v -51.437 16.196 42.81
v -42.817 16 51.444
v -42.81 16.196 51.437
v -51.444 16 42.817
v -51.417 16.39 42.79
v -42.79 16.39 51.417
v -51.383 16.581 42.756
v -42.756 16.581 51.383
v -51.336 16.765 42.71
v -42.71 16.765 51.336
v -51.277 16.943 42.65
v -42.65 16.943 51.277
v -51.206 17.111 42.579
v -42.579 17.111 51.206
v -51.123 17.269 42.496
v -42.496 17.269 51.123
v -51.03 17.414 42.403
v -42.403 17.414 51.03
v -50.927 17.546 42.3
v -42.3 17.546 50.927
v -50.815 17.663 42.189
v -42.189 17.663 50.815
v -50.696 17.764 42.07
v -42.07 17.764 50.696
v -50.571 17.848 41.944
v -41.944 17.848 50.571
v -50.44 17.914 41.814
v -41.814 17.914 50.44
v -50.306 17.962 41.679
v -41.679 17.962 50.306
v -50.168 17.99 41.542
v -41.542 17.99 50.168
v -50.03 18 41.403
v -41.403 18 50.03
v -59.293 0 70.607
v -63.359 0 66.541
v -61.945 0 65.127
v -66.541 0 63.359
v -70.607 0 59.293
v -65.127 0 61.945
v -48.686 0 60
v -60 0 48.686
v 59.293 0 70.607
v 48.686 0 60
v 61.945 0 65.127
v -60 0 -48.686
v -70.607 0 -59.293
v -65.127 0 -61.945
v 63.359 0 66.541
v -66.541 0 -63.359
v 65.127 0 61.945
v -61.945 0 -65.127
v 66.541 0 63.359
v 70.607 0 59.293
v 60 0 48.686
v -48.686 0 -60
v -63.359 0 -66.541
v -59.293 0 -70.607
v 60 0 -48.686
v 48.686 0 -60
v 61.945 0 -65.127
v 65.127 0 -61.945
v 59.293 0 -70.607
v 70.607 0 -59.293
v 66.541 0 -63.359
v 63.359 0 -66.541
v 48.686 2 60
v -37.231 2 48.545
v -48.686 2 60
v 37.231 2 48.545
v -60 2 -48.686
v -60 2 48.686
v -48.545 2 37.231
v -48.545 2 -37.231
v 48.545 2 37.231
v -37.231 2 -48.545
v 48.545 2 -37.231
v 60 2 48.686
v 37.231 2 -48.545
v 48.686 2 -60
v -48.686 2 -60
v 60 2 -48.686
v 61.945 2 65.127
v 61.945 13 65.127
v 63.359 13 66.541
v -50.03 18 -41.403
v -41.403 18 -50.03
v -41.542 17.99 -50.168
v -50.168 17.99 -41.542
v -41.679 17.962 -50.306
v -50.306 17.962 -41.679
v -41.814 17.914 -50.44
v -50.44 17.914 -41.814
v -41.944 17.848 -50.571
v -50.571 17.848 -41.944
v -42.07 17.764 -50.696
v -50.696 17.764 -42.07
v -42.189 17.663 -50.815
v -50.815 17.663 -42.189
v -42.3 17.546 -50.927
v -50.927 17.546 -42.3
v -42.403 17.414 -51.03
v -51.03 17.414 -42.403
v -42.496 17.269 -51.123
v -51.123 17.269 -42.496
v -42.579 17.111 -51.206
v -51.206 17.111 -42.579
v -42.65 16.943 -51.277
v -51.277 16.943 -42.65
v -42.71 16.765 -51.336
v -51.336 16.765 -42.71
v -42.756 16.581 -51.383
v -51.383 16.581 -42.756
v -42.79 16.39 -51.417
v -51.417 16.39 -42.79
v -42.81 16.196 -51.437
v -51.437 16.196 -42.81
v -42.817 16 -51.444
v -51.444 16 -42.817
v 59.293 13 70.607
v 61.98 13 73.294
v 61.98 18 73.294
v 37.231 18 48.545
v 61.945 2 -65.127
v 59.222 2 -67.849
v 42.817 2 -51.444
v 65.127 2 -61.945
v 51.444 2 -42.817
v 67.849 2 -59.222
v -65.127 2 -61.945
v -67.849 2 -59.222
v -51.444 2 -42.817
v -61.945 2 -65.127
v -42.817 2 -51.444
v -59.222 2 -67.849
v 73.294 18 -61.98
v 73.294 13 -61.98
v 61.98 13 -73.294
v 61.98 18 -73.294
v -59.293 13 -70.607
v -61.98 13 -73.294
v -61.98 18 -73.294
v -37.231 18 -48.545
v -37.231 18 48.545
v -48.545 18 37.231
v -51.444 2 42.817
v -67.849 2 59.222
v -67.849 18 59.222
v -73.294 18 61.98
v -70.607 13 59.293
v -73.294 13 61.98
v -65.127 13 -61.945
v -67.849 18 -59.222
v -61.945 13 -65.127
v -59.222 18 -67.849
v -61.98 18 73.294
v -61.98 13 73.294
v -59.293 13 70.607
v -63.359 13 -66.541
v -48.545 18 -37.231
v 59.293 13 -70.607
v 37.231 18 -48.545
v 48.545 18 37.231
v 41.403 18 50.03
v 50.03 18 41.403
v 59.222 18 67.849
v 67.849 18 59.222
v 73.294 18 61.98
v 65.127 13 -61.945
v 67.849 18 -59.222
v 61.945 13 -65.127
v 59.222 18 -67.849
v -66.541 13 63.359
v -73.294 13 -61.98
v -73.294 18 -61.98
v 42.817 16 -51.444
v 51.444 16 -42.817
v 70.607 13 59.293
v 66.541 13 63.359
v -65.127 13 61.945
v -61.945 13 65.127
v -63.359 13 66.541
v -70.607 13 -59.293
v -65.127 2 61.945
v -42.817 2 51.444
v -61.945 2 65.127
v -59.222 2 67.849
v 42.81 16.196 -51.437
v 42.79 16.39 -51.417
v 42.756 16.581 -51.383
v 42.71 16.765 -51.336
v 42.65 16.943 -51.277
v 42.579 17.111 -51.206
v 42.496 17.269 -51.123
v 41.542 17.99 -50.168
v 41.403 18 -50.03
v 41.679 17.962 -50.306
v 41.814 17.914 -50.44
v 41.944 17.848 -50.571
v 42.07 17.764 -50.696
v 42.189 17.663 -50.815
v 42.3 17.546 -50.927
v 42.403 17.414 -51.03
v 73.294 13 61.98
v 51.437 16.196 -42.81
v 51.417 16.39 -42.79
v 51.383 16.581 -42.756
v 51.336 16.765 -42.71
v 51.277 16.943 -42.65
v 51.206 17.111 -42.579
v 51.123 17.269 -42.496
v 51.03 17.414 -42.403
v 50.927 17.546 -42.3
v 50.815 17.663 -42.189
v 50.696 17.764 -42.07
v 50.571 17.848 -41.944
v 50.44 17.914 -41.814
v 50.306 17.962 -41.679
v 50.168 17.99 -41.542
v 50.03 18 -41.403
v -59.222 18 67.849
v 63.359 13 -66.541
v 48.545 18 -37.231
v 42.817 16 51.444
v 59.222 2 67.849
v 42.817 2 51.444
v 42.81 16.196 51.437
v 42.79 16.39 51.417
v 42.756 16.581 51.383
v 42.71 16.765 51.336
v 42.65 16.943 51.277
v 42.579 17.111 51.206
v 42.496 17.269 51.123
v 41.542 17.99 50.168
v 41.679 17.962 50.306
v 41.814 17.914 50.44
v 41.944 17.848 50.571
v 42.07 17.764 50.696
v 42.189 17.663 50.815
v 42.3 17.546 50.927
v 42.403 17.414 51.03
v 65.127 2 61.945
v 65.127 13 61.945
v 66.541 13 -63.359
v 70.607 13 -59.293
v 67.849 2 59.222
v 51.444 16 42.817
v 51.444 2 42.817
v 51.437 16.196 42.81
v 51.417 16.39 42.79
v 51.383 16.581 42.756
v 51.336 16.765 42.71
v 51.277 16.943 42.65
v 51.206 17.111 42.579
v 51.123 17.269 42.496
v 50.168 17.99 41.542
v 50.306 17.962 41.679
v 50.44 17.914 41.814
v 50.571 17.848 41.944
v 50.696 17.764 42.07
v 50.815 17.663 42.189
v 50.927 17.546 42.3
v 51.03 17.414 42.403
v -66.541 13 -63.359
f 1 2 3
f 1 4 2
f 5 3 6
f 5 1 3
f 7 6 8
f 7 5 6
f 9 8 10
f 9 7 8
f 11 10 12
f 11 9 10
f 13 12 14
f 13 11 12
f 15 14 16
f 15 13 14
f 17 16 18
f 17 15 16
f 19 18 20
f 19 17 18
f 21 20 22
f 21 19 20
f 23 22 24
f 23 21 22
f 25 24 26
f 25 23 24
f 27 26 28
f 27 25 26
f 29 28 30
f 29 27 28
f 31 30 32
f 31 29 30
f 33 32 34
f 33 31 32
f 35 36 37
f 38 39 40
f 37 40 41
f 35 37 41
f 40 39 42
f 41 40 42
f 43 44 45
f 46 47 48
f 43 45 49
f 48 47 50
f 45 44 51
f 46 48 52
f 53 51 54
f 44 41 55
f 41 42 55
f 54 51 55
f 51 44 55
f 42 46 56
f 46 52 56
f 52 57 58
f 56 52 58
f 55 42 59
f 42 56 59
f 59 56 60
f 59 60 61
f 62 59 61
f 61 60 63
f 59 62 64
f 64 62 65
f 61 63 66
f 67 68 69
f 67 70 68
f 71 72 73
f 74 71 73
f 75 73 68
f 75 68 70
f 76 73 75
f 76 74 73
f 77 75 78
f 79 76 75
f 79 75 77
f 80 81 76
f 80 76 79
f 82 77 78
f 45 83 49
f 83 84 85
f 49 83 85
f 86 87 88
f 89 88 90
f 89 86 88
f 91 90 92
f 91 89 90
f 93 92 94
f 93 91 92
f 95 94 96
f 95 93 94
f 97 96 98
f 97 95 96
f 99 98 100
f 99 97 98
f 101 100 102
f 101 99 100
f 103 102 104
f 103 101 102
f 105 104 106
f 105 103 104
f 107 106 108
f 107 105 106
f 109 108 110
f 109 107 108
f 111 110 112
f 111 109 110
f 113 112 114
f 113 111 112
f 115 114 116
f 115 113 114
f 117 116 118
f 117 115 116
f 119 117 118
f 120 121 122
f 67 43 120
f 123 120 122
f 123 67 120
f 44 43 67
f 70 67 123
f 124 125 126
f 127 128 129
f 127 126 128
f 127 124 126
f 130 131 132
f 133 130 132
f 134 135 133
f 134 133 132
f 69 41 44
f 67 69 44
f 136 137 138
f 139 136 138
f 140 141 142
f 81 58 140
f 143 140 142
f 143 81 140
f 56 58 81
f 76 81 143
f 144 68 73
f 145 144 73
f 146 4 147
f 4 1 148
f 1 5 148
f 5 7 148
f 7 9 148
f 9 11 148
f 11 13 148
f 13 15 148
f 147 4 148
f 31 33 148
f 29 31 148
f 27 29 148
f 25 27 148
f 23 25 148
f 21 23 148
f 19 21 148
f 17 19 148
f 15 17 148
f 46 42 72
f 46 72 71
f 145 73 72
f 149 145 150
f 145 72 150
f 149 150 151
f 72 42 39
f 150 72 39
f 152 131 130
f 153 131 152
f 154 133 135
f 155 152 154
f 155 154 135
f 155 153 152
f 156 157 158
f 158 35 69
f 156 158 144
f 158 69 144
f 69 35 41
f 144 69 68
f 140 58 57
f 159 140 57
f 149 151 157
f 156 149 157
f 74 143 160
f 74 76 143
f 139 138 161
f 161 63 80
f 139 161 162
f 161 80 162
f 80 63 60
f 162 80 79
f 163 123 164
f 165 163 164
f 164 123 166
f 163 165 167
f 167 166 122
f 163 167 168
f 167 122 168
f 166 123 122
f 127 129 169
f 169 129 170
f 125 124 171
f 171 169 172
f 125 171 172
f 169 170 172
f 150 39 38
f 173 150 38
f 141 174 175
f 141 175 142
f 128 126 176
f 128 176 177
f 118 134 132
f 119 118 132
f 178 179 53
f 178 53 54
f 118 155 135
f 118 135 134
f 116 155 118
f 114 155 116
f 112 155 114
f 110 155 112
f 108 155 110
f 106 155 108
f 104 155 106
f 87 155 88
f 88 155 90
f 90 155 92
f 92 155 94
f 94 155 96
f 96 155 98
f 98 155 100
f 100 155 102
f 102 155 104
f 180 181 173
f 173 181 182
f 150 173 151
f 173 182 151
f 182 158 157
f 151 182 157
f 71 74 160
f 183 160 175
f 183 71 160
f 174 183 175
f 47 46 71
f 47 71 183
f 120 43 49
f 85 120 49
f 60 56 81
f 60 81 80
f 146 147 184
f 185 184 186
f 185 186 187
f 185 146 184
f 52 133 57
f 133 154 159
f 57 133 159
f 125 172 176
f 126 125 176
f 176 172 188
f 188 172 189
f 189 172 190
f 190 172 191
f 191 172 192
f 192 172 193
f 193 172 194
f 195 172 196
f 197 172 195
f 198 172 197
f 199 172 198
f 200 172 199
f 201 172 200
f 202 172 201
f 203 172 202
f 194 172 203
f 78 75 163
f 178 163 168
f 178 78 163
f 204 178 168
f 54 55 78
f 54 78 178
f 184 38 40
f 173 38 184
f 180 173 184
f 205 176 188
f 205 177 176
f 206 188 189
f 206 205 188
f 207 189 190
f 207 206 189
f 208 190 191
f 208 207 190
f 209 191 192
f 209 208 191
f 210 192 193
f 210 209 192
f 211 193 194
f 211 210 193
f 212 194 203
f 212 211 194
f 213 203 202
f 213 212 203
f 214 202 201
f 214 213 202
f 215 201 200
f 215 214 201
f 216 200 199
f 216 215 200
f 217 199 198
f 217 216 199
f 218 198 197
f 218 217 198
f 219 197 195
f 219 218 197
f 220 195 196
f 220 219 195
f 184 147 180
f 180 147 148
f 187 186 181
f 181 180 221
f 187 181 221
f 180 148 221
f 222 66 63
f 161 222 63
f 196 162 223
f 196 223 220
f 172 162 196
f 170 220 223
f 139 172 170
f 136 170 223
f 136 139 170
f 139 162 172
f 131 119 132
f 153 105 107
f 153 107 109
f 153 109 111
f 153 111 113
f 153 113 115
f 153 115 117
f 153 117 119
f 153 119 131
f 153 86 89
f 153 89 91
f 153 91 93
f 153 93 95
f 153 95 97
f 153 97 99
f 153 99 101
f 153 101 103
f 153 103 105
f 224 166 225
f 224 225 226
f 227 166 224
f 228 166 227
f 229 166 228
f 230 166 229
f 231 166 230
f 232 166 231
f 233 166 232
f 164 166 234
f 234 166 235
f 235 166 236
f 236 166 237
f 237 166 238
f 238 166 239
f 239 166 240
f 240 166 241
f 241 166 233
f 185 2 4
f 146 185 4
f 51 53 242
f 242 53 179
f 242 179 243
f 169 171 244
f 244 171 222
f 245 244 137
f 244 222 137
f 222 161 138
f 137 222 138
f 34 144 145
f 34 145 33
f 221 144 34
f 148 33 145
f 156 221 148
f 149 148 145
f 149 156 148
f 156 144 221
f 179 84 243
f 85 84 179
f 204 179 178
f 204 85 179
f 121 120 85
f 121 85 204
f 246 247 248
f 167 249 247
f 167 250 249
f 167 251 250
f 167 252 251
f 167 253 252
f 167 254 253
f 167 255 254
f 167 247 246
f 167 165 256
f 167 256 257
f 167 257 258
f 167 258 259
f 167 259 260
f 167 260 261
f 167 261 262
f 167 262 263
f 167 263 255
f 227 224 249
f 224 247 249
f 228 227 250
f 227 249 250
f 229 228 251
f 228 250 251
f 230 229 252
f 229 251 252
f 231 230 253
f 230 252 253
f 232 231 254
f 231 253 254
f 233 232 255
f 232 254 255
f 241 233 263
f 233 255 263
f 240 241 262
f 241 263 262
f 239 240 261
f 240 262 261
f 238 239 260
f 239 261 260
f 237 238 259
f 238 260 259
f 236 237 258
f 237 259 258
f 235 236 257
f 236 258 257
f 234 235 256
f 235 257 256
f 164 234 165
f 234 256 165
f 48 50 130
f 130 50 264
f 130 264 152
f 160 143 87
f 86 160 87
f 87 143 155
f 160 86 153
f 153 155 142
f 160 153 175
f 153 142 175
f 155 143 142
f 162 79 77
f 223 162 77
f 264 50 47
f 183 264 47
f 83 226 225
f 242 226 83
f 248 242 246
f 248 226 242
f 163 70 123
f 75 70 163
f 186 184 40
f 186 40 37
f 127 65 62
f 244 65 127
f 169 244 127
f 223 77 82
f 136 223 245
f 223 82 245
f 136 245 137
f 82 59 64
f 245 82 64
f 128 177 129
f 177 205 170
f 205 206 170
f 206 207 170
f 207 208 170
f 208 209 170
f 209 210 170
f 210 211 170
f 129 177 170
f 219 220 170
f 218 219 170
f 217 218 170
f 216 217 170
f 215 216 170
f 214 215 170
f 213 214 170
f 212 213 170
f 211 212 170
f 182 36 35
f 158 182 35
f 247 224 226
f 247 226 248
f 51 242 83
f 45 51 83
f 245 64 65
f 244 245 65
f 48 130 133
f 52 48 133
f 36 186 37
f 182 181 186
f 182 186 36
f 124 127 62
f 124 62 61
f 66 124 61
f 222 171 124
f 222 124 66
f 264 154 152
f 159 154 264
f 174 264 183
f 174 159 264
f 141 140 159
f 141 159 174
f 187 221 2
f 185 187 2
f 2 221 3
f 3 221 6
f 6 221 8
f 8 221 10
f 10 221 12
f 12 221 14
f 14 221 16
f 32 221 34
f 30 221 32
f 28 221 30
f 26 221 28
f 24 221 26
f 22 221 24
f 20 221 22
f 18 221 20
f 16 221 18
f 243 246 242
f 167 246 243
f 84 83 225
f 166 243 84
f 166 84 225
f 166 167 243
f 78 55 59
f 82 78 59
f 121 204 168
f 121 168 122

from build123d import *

# Parameters (mm, degrees)
SKETCH1_W            = 120
SKETCH1_H            = 120
BOSS_EXTRUDE1_DEPTH  = 2
BOSS_EXTRUDE2_DEPTH  = 13
MIRROR2_COPY_1_DEPTH = 13
CUT_EXTRUDE1_DEPTH   = 16.5
MIRROR4_COPY_1_DEPTH = 16.5
BOSS_EXTRUDE3_DEPTH  = 5
CUT_EXTRUDE2_DEPTH   = 6
MIRROR6_COPY_1_DEPTH = 5
MIRROR6_COPY_2_DEPTH = 6
FILLET1_R            = 2
FILLET2_R            = 2
FILLET3_R            = 2
FILLET4_R            = 2


with BuildPart() as part:
    # Sketch1 → Boss-Extrude1 (new body)
    with BuildSketch(Plane(origin=(0, 0, 0), x_dir=(1, 0, 0), z_dir=(0, 1, 0))):
        Polygon((-59.292893219, -70.606601718), (-48.686291501, -60), (-60, -60), (-60, -48.686291501), (-70.606601718, -59.292893219), align=None)
        Polygon((-70.606601718, 59.292893219), (-60, 48.686291501), (-60, 60), (-48.686291501, 60), (-59.292893219, 70.606601718), align=None)
        Rectangle(SKETCH1_W, SKETCH1_H)
        Polygon((60, 60), (60, 48.686291501), (70.606601718, 59.292893219), (59.292893219, 70.606601718), (48.686291501, 60), align=None)
        Polygon((60, -48.686291501), (60, -60), (48.686291501, -60), (59.292893219, -70.606601718), (70.606601718, -59.292893219), align=None)
    extrude(amount=BOSS_EXTRUDE1_DEPTH)

    # Sketch2 → Boss-Extrude2 (add)
    with BuildSketch(Plane(origin=(0, 0, 0), x_dir=(1, 0, 0), z_dir=(0, 1, 0))):
        Polygon((59.292893219, -70.606601718), (70.606601718, -59.292893219), (69.192388155, -57.878679656), (52.787510832, -41.473802333), (48.544870145, -37.231161646), (37.231161646, -48.544870145), (41.473802333, -52.787510832), (57.878679656, -69.192388155), align=None)
        Polygon((59.222182541, -67.848885271), (67.848885271, -59.222182541), (51.444007948, -42.817305217), (42.817305217, -51.444007948), align=None, mode=Mode.SUBTRACT)
    boss_extrude2 = extrude(amount=BOSS_EXTRUDE2_DEPTH)

    # Mirror1: Boss-Extrude2 across plane
    add(boss_extrude2.mirror(Plane(origin=(0, 0, 0), x_dir=(0, 0, 1), z_dir=(1, 0, 0))))

    # Mirror2: Boss-Extrude2 across plane
    add(boss_extrude2.mirror(Plane.XY))

    # Mirror2 copy 1 sketch → Mirror2 copy 1 (add)
    with BuildSketch(Plane(origin=(0, 0, 0), x_dir=(-1, 0, 0), z_dir=(0, 1, 0))):
        Polygon((59.292893219, -70.606601718), (70.606601718, -59.292893219), (69.192388155, -57.878679656), (52.787510832, -41.473802333), (48.544870145, -37.231161646), (37.231161646, -48.544870145), (41.473802333, -52.787510832), (57.878679656, -69.192388155), align=None)
        Polygon((59.222182541, -67.848885271), (67.848885271, -59.222182541), (51.444007948, -42.817305217), (42.817305217, -51.444007948), align=None, mode=Mode.SUBTRACT)
    extrude(amount=MIRROR2_COPY_1_DEPTH)

    # Sketch3 → Cut-Extrude1 (cut)
    with BuildSketch(Plane(origin=(0, 13, 0), x_dir=(1, 0, 0), z_dir=(0, 1, 0))):
        Polygon((61.944543648, -65.126524164), (63.358757211, -66.540737726), (66.540737726, -63.358757211), (65.126524164, -61.944543648), align=None)
    cut_extrude1 = extrude(amount=-CUT_EXTRUDE1_DEPTH, mode=Mode.SUBTRACT)

    # Mirror3: Cut-Extrude1 across plane
    add(cut_extrude1.mirror(Plane(origin=(0, 0, 0), x_dir=(0, 0, 1), z_dir=(1, 0, 0))), mode=Mode.SUBTRACT)

    # Mirror4: Cut-Extrude1 across plane
    add(cut_extrude1.mirror(Plane.XY), mode=Mode.SUBTRACT)

    # Mirror4 copy 1 sketch → Mirror4 copy 1 (cut)
    with BuildSketch(Plane(origin=(0, 13, 0), x_dir=(-1, 0, 0), z_dir=(0, 1, 0))):
        Polygon((61.944543648, -65.126524164), (63.358757211, -66.540737726), (66.540737726, -63.358757211), (65.126524164, -61.944543648), align=None)
    extrude(amount=-MIRROR4_COPY_1_DEPTH, mode=Mode.SUBTRACT)

    # Sketch4 → Boss-Extrude3 (add)
    with BuildSketch(Plane(origin=(0, 13, 0), x_dir=(1, 0, 0), z_dir=(0, 1, 0))):
        Polygon((37.231161646, 48.544870145), (48.544870145, 37.231161646), (73.293607486, 61.979898987), (61.979898987, 73.293607486), align=None)
    boss_extrude3 = extrude(amount=BOSS_EXTRUDE3_DEPTH)

    # Sketch7 → Cut-Extrude2 (cut)
    with BuildSketch(Plane(origin=(0, 18, 0), x_dir=(1, 0, 0), z_dir=(0, 1, 0))):
        Polygon((42.817305217, 51.444007948), (51.444007948, 42.817305217), (67.848885271, 59.222182541), (59.222182541, 67.848885271), align=None)
    cut_extrude2 = extrude(amount=-CUT_EXTRUDE2_DEPTH, mode=Mode.SUBTRACT)

    # Mirror5: Boss-Extrude3, Cut-Extrude2 across plane
    add(boss_extrude3.mirror(Plane.XY))
    add(cut_extrude2.mirror(Plane.XY), mode=Mode.SUBTRACT)

    # Mirror6: Boss-Extrude3, Cut-Extrude2 across plane
    add(boss_extrude3.mirror(Plane(origin=(0, 0, 0), x_dir=(0, 0, 1), z_dir=(1, 0, 0))))
    add(cut_extrude2.mirror(Plane(origin=(0, 0, 0), x_dir=(0, 0, 1), z_dir=(1, 0, 0))), mode=Mode.SUBTRACT)

    # Mirror6 copy 1 sketch → Mirror6 copy 1 (add)
    with BuildSketch(Plane(origin=(0, 13, 0), x_dir=(-1, 0, 0), z_dir=(0, 1, 0))):
        Polygon((37.231161646, 48.544870145), (48.544870145, 37.231161646), (73.293607486, 61.979898987), (61.979898987, 73.293607486), align=None)
    extrude(amount=MIRROR6_COPY_1_DEPTH)

    # Mirror6 copy 2 sketch → Mirror6 copy 2 (cut)
    with BuildSketch(Plane(origin=(0, 18, 0), x_dir=(-1, 0, 0), z_dir=(0, 1, 0))):
        Polygon((42.817305217, 51.444007948), (51.444007948, 42.817305217), (67.848885271, 59.222182541), (59.222182541, 67.848885271), align=None)
    extrude(amount=-MIRROR6_COPY_2_DEPTH, mode=Mode.SUBTRACT)

    # Fillet1
    fillet1_edges = [part.edges().sort_by_distance(p)[0] for p in [
        (-47.130656582, 18, -47.130656582),
    ]]
    fillet(fillet1_edges, radius=FILLET1_R)

    # Fillet2
    fillet2_edges = [part.edges().sort_by_distance(p)[0] for p in [
        (-47.130656582, 18, 47.130656582),
    ]]
    fillet(fillet2_edges, radius=FILLET2_R)

    # Fillet3
    fillet3_edges = [part.edges().sort_by_distance(p)[0] for p in [
        (47.130656582, 18, -47.130656582),
    ]]
    fillet(fillet3_edges, radius=FILLET3_R)

    # Fillet4
    fillet4_edges = [part.edges().sort_by_distance(p)[0] for p in [
        (47.130656582, 18, 47.130656582),
    ]]
    fillet(fillet4_edges, radius=FILLET4_R)


solid = part.part
